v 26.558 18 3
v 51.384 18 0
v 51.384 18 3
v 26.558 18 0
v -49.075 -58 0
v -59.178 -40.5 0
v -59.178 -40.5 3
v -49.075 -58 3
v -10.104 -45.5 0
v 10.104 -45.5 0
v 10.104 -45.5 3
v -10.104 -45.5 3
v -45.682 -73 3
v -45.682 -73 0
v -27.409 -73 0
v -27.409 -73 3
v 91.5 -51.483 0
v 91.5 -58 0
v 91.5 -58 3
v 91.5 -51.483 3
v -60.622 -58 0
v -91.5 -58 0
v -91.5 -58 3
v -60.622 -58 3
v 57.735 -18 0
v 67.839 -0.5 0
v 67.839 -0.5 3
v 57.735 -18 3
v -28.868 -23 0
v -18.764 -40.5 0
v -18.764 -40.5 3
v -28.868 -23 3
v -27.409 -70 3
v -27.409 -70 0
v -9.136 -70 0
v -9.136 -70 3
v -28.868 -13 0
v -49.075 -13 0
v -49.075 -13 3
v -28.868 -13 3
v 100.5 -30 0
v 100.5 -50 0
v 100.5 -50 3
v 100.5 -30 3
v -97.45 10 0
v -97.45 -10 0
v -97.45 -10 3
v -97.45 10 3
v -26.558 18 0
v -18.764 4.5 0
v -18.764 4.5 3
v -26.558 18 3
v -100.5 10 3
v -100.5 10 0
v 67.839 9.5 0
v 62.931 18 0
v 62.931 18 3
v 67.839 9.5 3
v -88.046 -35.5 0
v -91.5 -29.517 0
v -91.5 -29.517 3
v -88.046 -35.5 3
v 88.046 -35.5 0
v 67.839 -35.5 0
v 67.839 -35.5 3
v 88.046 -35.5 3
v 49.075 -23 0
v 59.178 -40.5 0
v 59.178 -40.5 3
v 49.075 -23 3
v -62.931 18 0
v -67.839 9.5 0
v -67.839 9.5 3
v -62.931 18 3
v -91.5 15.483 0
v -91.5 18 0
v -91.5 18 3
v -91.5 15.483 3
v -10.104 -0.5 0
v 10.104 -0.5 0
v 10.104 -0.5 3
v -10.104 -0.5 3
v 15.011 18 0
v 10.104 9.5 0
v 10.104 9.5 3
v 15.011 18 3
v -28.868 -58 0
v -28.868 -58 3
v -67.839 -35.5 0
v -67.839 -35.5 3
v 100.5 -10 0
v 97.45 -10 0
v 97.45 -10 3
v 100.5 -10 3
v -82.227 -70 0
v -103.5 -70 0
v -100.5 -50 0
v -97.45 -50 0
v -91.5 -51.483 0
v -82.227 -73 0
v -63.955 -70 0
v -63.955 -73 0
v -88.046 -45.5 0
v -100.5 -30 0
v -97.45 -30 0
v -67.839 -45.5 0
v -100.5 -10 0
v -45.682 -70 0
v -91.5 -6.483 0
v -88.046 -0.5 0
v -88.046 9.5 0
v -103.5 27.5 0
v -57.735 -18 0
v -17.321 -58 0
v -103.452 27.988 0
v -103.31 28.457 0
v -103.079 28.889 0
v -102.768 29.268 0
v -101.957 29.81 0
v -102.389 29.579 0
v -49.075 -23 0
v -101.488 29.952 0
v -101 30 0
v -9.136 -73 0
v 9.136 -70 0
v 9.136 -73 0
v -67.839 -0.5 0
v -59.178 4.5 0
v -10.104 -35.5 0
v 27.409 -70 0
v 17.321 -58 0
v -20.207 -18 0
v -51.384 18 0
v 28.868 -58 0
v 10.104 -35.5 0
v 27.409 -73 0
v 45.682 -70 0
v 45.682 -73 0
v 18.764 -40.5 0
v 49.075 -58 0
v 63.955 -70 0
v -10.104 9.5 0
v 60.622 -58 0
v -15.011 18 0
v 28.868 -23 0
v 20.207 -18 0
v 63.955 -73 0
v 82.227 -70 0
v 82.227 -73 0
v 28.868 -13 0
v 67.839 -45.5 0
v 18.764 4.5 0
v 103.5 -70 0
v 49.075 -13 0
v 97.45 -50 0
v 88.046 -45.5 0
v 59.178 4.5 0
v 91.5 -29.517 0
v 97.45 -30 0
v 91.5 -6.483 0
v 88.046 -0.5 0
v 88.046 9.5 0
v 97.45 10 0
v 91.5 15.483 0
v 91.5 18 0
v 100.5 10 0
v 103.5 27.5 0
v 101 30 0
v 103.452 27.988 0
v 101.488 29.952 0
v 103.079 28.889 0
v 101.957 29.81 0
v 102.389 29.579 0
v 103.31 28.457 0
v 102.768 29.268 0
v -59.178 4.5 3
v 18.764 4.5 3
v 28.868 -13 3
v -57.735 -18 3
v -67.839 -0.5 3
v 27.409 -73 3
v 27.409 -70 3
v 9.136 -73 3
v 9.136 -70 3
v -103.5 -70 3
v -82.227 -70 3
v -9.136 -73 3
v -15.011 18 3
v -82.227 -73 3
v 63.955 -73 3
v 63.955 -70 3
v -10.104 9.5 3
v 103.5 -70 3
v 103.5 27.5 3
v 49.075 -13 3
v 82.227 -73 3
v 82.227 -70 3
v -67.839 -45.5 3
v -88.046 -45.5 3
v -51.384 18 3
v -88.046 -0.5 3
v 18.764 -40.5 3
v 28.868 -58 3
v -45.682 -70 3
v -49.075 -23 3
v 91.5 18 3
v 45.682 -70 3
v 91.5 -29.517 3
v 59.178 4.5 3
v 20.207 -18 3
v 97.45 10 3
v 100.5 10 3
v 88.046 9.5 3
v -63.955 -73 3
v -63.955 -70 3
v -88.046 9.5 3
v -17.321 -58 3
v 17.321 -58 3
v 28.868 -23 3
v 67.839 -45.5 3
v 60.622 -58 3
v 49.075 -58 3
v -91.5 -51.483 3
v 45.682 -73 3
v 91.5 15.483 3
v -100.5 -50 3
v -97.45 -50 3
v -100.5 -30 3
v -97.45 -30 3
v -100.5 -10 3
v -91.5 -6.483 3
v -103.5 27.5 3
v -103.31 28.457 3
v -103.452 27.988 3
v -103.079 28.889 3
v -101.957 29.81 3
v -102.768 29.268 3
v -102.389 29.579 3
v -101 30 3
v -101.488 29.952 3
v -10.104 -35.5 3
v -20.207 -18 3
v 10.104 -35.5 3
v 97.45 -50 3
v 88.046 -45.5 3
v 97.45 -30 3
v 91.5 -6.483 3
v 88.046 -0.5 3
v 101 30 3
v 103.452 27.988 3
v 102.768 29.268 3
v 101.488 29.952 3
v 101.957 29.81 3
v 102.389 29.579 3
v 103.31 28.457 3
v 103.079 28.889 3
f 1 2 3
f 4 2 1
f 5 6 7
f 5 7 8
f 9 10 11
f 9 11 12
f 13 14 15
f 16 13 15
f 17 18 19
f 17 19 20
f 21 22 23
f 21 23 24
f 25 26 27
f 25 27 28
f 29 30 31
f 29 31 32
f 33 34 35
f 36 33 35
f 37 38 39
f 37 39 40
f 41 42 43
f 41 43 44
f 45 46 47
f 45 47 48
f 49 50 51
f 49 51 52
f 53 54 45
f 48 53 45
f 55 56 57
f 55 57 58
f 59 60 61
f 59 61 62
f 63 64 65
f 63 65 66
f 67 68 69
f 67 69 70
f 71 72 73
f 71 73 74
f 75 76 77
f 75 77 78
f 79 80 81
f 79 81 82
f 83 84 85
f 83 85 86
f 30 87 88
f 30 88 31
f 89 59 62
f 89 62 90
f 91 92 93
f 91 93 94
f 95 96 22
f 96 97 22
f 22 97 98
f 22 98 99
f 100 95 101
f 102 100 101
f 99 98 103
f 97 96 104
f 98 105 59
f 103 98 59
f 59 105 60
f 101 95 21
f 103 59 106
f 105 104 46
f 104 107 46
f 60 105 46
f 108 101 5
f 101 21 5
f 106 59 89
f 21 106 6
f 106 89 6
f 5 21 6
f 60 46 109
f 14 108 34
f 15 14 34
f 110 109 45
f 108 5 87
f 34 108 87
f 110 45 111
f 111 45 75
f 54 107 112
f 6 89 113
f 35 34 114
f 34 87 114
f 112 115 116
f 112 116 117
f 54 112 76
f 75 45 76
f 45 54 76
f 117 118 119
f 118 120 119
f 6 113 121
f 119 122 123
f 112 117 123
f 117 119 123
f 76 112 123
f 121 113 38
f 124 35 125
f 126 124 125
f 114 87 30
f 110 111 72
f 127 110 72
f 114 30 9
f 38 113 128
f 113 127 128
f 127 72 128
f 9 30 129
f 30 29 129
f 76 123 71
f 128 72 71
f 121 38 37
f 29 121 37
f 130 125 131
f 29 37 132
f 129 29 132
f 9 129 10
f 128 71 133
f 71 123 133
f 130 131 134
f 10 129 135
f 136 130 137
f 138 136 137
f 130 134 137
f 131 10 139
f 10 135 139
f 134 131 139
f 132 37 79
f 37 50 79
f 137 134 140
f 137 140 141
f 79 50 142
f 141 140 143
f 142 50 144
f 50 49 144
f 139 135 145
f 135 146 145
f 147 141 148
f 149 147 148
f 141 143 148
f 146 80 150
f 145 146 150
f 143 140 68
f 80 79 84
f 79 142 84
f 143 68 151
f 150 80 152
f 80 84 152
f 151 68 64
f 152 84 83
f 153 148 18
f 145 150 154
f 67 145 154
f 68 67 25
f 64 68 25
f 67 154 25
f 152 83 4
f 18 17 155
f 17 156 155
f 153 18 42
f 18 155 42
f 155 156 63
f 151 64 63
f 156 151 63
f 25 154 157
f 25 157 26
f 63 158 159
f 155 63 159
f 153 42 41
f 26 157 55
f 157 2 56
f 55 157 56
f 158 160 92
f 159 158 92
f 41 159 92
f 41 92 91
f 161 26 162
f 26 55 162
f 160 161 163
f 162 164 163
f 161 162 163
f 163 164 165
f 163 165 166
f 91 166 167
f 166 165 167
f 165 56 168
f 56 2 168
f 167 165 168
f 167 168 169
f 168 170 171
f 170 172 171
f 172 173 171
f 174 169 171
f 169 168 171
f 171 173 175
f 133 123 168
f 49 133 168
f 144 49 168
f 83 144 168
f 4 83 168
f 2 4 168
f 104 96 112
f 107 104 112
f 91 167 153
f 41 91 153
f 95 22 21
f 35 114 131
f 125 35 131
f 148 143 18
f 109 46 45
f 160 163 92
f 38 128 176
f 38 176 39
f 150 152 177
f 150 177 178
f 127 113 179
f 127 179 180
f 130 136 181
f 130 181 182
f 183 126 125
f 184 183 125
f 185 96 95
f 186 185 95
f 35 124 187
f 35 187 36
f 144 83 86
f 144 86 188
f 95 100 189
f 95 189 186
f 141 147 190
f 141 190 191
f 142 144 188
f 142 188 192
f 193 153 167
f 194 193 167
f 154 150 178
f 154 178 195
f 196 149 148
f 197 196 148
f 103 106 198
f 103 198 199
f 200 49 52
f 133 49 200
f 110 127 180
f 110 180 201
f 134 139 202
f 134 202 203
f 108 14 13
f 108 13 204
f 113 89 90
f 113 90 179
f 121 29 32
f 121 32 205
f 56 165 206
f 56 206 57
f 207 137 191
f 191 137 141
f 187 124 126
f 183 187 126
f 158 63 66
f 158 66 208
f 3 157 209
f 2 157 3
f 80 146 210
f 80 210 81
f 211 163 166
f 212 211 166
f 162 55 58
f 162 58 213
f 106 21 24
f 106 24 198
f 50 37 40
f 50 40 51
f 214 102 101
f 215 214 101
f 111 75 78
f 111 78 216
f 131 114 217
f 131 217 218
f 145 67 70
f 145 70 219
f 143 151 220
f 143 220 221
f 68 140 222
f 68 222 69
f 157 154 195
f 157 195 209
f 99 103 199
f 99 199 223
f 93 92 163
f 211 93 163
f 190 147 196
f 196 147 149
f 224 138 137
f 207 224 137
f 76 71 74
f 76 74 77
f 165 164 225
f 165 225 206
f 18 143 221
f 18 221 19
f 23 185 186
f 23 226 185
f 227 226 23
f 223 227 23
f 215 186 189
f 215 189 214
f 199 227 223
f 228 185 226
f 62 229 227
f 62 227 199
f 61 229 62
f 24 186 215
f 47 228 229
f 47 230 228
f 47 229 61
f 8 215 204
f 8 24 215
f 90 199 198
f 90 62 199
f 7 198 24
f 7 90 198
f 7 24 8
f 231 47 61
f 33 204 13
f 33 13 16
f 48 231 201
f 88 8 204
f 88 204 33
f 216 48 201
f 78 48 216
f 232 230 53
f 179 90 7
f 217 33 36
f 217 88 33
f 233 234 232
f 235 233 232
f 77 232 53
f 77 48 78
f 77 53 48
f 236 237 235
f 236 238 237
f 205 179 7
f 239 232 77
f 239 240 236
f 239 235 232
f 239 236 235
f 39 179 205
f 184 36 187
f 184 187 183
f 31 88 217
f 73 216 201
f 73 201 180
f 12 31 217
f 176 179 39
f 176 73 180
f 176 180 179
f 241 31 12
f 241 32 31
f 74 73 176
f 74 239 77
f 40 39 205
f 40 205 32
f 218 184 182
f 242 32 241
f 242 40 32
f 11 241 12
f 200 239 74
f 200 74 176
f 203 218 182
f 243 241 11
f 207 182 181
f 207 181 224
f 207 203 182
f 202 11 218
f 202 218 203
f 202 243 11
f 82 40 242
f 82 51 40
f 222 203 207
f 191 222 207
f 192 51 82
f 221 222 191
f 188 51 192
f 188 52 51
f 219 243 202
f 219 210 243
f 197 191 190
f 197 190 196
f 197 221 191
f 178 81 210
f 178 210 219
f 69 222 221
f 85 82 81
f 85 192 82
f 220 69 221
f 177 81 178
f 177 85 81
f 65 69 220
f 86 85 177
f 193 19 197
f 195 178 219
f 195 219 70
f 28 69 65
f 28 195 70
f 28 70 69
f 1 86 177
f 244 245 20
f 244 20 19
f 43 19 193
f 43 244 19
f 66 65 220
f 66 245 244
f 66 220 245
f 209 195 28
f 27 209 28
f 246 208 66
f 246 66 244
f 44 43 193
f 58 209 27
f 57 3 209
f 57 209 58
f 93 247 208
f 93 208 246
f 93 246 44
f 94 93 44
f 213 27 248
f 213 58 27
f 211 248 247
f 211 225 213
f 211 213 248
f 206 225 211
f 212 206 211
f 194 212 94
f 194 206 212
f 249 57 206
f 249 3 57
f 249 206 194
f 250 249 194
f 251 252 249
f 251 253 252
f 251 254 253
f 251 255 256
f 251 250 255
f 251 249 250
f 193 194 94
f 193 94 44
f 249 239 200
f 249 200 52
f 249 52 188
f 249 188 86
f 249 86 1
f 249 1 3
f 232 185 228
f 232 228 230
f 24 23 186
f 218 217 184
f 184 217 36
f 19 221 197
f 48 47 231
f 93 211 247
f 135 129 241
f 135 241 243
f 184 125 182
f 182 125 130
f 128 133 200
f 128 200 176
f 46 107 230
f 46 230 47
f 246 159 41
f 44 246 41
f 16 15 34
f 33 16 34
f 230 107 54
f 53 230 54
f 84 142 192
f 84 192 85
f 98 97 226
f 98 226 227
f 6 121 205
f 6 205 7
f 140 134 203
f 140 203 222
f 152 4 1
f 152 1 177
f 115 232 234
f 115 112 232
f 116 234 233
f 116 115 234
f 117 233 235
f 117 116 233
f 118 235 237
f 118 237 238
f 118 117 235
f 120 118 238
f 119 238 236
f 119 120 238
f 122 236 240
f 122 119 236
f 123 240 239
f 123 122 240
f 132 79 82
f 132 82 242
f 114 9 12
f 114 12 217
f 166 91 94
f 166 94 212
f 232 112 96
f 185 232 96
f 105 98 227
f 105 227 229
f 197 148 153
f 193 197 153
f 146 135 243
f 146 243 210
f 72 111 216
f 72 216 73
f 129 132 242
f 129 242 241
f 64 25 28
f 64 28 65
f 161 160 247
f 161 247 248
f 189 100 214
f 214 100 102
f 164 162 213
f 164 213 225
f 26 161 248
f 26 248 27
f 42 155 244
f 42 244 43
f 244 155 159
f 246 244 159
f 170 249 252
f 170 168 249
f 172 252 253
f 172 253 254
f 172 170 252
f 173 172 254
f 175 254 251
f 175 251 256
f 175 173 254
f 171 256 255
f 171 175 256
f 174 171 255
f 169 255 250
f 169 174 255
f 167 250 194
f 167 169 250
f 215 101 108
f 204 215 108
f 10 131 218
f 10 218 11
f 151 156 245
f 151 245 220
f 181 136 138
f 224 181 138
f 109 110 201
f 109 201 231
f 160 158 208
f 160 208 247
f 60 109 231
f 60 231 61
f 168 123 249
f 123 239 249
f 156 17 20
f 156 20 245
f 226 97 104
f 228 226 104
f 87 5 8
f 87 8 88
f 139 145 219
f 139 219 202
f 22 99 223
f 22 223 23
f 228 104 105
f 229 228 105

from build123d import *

# Parameters (mm, degrees)
SKETCH1_W               = 3.05
SKETCH1_H               = 20
SKETCH1_W_2             = 18.272727272
SKETCH1_H_2             = 3
SKETCH1_W_3             = 18.272727273
BOSS_EXTRUDE1_DEPTH     = 3
SKETCH5_W               = 207
SKETCH5_H               = 40
CUT_EXTRUDE7_DEPTH      = 1
CUT_EXTRUDE7_DEPTH_BACK = 4
FILLET3_R               = 2.5
CUT_EXTRUDE8_DEPTH      = 4
CUT_EXTRUDE8_DEPTH_BACK = 1


with BuildPart() as part:
    # Sketch1 → Boss-Extrude1 (new body)
    with BuildSketch(Plane.XY):
        Polygon((-103.5, 70), (-103.5, -70), (-82.227272727, -70), (-63.954545455, -70), (-45.681818182, -70), (-27.409090909, -70), (-9.136363636, -70), (9.136363636, -70), (27.409090909, -70), (45.681818182, -70), (63.954545455, -70), (82.227272727, -70), (103.5, -70), (103.5, 70), align=None)
        with Locations((-98.975, -40)):
            Rectangle(SKETCH1_W, SKETCH1_H, mode=Mode.SUBTRACT)
        with Locations((98.975, -40)):
            Rectangle(SKETCH1_W, SKETCH1_H, mode=Mode.SUBTRACT)
        with Locations((-98.975, 0)):
            Rectangle(SKETCH1_W, SKETCH1_H, mode=Mode.SUBTRACT)
        with Locations((-98.975, 40)):
            Rectangle(SKETCH1_W, SKETCH1_H, mode=Mode.SUBTRACT)
        with Locations((98.975, 0)):
            Rectangle(SKETCH1_W, SKETCH1_H, mode=Mode.SUBTRACT)
        with Locations((98.975, 40)):
            Rectangle(SKETCH1_W, SKETCH1_H, mode=Mode.SUBTRACT)
        with Locations((-73.090909091, -71.5)):
            Rectangle(SKETCH1_W_2, SKETCH1_H_2)
        with Locations((-36.545454546, -71.5)):
            Rectangle(SKETCH1_W_3, SKETCH1_H_2)
        with Locations((0, -71.5)):
            Rectangle(SKETCH1_W_2, SKETCH1_H_2)
        with Locations((36.545454546, -71.5)):
            Rectangle(SKETCH1_W_3, SKETCH1_H_2)
        with Locations((73.090909091, -71.5)):
            Rectangle(SKETCH1_W_2, SKETCH1_H_2)
    extrude(amount=BOSS_EXTRUDE1_DEPTH)

    # Sketch5 → Cut-Extrude7 (cut, two sides)
    with BuildSketch(Plane.XY.offset(3)) as cut_extrude7_sk:
        with Locations((0, 50)):
            Rectangle(SKETCH5_W, SKETCH5_H)
    extrude(amount=CUT_EXTRUDE7_DEPTH, mode=Mode.SUBTRACT)
    extrude(cut_extrude7_sk.sketch, amount=-CUT_EXTRUDE7_DEPTH_BACK, mode=Mode.SUBTRACT)

    # Fillet3
    fillet3_edges = [part.edges().sort_by_distance(p)[0] for p in [
        (103.5, 30, 1.5),
        (-103.5, 30, 1.5),
    ]]
    fillet(fillet3_edges, radius=FILLET3_R)

    # Sketch6 → Cut-Extrude8 (cut, two sides)
    with BuildSketch(Plane.XY) as cut_extrude8_sk:
        Polygon((-88.045916051, -0.5), (-91.5, -6.482648893), (-91.5, -29.517351107), (-88.045916051, -35.5), (-67.83865663, -35.5), (-57.735026919, -18), (-67.83865663, -0.5), align=None)
        Polygon((-62.931179342, 18), (-91.5, 18), (-91.5, 15.482648893), (-88.045916051, 9.5), (-67.83865663, 9.5), align=None)
        Polygon((-26.558112383, 18), (-51.384173958, 18), (-59.178402592, 4.5), (-49.074772881, -13), (-28.867513459, -13), (-18.763883749, 4.5), align=None)
        Polygon((10.103629711, -35.5), (20.207259422, -18), (10.103629711, -0.5), (-10.103629711, -0.5), (-20.207259422, -18), (-10.103629711, -35.5), align=None)
        Polygon((51.384173958, 18), (26.558112383, 18), (18.763883749, 4.5), (28.867513459, -13), (49.074772881, -13), (59.178402592, 4.5), align=None)
        Polygon((91.5, -29.517351107), (91.5, -6.482648893), (88.045916051, -0.5), (67.83865663, -0.5), (57.735026919, -18), (67.83865663, -35.5), (88.045916051, -35.5), align=None)
        Polygon((91.5, 15.482648893), (91.5, 18), (62.931179342, 18), (67.83865663, 9.5), (88.045916051, 9.5), align=None)
        Polygon((15.011106999, 18), (-15.011106999, 18), (-10.103629711, 9.5), (10.103629711, 9.5), align=None)
        Polygon((-28.867513459, -23), (-49.074772881, -23), (-59.178402592, -40.5), (-49.074772881, -58), (-28.867513459, -58), (-18.763883749, -40.5), align=None)
        Polygon((-88.045916051, -45.5), (-91.5, -51.482648893), (-91.5, -58), (-60.621778265, -58), (-67.83865663, -45.5), align=None)
        Polygon((-10.103629711, -45.5), (-17.320508076, -58), (17.320508076, -58), (10.103629711, -45.5), align=None)
        Polygon((49.074772881, -23), (28.867513459, -23), (18.763883749, -40.5), (28.867513459, -58), (49.074772881, -58), (59.178402592, -40.5), align=None)
        Polygon((91.5, -58), (91.5, -51.482648893), (88.045916051, -45.5), (67.83865663, -45.5), (60.621778265, -58), align=None)
    extrude(amount=CUT_EXTRUDE8_DEPTH, mode=Mode.SUBTRACT)
    extrude(cut_extrude8_sk.sketch, amount=-CUT_EXTRUDE8_DEPTH_BACK, mode=Mode.SUBTRACT)


solid = part.part
